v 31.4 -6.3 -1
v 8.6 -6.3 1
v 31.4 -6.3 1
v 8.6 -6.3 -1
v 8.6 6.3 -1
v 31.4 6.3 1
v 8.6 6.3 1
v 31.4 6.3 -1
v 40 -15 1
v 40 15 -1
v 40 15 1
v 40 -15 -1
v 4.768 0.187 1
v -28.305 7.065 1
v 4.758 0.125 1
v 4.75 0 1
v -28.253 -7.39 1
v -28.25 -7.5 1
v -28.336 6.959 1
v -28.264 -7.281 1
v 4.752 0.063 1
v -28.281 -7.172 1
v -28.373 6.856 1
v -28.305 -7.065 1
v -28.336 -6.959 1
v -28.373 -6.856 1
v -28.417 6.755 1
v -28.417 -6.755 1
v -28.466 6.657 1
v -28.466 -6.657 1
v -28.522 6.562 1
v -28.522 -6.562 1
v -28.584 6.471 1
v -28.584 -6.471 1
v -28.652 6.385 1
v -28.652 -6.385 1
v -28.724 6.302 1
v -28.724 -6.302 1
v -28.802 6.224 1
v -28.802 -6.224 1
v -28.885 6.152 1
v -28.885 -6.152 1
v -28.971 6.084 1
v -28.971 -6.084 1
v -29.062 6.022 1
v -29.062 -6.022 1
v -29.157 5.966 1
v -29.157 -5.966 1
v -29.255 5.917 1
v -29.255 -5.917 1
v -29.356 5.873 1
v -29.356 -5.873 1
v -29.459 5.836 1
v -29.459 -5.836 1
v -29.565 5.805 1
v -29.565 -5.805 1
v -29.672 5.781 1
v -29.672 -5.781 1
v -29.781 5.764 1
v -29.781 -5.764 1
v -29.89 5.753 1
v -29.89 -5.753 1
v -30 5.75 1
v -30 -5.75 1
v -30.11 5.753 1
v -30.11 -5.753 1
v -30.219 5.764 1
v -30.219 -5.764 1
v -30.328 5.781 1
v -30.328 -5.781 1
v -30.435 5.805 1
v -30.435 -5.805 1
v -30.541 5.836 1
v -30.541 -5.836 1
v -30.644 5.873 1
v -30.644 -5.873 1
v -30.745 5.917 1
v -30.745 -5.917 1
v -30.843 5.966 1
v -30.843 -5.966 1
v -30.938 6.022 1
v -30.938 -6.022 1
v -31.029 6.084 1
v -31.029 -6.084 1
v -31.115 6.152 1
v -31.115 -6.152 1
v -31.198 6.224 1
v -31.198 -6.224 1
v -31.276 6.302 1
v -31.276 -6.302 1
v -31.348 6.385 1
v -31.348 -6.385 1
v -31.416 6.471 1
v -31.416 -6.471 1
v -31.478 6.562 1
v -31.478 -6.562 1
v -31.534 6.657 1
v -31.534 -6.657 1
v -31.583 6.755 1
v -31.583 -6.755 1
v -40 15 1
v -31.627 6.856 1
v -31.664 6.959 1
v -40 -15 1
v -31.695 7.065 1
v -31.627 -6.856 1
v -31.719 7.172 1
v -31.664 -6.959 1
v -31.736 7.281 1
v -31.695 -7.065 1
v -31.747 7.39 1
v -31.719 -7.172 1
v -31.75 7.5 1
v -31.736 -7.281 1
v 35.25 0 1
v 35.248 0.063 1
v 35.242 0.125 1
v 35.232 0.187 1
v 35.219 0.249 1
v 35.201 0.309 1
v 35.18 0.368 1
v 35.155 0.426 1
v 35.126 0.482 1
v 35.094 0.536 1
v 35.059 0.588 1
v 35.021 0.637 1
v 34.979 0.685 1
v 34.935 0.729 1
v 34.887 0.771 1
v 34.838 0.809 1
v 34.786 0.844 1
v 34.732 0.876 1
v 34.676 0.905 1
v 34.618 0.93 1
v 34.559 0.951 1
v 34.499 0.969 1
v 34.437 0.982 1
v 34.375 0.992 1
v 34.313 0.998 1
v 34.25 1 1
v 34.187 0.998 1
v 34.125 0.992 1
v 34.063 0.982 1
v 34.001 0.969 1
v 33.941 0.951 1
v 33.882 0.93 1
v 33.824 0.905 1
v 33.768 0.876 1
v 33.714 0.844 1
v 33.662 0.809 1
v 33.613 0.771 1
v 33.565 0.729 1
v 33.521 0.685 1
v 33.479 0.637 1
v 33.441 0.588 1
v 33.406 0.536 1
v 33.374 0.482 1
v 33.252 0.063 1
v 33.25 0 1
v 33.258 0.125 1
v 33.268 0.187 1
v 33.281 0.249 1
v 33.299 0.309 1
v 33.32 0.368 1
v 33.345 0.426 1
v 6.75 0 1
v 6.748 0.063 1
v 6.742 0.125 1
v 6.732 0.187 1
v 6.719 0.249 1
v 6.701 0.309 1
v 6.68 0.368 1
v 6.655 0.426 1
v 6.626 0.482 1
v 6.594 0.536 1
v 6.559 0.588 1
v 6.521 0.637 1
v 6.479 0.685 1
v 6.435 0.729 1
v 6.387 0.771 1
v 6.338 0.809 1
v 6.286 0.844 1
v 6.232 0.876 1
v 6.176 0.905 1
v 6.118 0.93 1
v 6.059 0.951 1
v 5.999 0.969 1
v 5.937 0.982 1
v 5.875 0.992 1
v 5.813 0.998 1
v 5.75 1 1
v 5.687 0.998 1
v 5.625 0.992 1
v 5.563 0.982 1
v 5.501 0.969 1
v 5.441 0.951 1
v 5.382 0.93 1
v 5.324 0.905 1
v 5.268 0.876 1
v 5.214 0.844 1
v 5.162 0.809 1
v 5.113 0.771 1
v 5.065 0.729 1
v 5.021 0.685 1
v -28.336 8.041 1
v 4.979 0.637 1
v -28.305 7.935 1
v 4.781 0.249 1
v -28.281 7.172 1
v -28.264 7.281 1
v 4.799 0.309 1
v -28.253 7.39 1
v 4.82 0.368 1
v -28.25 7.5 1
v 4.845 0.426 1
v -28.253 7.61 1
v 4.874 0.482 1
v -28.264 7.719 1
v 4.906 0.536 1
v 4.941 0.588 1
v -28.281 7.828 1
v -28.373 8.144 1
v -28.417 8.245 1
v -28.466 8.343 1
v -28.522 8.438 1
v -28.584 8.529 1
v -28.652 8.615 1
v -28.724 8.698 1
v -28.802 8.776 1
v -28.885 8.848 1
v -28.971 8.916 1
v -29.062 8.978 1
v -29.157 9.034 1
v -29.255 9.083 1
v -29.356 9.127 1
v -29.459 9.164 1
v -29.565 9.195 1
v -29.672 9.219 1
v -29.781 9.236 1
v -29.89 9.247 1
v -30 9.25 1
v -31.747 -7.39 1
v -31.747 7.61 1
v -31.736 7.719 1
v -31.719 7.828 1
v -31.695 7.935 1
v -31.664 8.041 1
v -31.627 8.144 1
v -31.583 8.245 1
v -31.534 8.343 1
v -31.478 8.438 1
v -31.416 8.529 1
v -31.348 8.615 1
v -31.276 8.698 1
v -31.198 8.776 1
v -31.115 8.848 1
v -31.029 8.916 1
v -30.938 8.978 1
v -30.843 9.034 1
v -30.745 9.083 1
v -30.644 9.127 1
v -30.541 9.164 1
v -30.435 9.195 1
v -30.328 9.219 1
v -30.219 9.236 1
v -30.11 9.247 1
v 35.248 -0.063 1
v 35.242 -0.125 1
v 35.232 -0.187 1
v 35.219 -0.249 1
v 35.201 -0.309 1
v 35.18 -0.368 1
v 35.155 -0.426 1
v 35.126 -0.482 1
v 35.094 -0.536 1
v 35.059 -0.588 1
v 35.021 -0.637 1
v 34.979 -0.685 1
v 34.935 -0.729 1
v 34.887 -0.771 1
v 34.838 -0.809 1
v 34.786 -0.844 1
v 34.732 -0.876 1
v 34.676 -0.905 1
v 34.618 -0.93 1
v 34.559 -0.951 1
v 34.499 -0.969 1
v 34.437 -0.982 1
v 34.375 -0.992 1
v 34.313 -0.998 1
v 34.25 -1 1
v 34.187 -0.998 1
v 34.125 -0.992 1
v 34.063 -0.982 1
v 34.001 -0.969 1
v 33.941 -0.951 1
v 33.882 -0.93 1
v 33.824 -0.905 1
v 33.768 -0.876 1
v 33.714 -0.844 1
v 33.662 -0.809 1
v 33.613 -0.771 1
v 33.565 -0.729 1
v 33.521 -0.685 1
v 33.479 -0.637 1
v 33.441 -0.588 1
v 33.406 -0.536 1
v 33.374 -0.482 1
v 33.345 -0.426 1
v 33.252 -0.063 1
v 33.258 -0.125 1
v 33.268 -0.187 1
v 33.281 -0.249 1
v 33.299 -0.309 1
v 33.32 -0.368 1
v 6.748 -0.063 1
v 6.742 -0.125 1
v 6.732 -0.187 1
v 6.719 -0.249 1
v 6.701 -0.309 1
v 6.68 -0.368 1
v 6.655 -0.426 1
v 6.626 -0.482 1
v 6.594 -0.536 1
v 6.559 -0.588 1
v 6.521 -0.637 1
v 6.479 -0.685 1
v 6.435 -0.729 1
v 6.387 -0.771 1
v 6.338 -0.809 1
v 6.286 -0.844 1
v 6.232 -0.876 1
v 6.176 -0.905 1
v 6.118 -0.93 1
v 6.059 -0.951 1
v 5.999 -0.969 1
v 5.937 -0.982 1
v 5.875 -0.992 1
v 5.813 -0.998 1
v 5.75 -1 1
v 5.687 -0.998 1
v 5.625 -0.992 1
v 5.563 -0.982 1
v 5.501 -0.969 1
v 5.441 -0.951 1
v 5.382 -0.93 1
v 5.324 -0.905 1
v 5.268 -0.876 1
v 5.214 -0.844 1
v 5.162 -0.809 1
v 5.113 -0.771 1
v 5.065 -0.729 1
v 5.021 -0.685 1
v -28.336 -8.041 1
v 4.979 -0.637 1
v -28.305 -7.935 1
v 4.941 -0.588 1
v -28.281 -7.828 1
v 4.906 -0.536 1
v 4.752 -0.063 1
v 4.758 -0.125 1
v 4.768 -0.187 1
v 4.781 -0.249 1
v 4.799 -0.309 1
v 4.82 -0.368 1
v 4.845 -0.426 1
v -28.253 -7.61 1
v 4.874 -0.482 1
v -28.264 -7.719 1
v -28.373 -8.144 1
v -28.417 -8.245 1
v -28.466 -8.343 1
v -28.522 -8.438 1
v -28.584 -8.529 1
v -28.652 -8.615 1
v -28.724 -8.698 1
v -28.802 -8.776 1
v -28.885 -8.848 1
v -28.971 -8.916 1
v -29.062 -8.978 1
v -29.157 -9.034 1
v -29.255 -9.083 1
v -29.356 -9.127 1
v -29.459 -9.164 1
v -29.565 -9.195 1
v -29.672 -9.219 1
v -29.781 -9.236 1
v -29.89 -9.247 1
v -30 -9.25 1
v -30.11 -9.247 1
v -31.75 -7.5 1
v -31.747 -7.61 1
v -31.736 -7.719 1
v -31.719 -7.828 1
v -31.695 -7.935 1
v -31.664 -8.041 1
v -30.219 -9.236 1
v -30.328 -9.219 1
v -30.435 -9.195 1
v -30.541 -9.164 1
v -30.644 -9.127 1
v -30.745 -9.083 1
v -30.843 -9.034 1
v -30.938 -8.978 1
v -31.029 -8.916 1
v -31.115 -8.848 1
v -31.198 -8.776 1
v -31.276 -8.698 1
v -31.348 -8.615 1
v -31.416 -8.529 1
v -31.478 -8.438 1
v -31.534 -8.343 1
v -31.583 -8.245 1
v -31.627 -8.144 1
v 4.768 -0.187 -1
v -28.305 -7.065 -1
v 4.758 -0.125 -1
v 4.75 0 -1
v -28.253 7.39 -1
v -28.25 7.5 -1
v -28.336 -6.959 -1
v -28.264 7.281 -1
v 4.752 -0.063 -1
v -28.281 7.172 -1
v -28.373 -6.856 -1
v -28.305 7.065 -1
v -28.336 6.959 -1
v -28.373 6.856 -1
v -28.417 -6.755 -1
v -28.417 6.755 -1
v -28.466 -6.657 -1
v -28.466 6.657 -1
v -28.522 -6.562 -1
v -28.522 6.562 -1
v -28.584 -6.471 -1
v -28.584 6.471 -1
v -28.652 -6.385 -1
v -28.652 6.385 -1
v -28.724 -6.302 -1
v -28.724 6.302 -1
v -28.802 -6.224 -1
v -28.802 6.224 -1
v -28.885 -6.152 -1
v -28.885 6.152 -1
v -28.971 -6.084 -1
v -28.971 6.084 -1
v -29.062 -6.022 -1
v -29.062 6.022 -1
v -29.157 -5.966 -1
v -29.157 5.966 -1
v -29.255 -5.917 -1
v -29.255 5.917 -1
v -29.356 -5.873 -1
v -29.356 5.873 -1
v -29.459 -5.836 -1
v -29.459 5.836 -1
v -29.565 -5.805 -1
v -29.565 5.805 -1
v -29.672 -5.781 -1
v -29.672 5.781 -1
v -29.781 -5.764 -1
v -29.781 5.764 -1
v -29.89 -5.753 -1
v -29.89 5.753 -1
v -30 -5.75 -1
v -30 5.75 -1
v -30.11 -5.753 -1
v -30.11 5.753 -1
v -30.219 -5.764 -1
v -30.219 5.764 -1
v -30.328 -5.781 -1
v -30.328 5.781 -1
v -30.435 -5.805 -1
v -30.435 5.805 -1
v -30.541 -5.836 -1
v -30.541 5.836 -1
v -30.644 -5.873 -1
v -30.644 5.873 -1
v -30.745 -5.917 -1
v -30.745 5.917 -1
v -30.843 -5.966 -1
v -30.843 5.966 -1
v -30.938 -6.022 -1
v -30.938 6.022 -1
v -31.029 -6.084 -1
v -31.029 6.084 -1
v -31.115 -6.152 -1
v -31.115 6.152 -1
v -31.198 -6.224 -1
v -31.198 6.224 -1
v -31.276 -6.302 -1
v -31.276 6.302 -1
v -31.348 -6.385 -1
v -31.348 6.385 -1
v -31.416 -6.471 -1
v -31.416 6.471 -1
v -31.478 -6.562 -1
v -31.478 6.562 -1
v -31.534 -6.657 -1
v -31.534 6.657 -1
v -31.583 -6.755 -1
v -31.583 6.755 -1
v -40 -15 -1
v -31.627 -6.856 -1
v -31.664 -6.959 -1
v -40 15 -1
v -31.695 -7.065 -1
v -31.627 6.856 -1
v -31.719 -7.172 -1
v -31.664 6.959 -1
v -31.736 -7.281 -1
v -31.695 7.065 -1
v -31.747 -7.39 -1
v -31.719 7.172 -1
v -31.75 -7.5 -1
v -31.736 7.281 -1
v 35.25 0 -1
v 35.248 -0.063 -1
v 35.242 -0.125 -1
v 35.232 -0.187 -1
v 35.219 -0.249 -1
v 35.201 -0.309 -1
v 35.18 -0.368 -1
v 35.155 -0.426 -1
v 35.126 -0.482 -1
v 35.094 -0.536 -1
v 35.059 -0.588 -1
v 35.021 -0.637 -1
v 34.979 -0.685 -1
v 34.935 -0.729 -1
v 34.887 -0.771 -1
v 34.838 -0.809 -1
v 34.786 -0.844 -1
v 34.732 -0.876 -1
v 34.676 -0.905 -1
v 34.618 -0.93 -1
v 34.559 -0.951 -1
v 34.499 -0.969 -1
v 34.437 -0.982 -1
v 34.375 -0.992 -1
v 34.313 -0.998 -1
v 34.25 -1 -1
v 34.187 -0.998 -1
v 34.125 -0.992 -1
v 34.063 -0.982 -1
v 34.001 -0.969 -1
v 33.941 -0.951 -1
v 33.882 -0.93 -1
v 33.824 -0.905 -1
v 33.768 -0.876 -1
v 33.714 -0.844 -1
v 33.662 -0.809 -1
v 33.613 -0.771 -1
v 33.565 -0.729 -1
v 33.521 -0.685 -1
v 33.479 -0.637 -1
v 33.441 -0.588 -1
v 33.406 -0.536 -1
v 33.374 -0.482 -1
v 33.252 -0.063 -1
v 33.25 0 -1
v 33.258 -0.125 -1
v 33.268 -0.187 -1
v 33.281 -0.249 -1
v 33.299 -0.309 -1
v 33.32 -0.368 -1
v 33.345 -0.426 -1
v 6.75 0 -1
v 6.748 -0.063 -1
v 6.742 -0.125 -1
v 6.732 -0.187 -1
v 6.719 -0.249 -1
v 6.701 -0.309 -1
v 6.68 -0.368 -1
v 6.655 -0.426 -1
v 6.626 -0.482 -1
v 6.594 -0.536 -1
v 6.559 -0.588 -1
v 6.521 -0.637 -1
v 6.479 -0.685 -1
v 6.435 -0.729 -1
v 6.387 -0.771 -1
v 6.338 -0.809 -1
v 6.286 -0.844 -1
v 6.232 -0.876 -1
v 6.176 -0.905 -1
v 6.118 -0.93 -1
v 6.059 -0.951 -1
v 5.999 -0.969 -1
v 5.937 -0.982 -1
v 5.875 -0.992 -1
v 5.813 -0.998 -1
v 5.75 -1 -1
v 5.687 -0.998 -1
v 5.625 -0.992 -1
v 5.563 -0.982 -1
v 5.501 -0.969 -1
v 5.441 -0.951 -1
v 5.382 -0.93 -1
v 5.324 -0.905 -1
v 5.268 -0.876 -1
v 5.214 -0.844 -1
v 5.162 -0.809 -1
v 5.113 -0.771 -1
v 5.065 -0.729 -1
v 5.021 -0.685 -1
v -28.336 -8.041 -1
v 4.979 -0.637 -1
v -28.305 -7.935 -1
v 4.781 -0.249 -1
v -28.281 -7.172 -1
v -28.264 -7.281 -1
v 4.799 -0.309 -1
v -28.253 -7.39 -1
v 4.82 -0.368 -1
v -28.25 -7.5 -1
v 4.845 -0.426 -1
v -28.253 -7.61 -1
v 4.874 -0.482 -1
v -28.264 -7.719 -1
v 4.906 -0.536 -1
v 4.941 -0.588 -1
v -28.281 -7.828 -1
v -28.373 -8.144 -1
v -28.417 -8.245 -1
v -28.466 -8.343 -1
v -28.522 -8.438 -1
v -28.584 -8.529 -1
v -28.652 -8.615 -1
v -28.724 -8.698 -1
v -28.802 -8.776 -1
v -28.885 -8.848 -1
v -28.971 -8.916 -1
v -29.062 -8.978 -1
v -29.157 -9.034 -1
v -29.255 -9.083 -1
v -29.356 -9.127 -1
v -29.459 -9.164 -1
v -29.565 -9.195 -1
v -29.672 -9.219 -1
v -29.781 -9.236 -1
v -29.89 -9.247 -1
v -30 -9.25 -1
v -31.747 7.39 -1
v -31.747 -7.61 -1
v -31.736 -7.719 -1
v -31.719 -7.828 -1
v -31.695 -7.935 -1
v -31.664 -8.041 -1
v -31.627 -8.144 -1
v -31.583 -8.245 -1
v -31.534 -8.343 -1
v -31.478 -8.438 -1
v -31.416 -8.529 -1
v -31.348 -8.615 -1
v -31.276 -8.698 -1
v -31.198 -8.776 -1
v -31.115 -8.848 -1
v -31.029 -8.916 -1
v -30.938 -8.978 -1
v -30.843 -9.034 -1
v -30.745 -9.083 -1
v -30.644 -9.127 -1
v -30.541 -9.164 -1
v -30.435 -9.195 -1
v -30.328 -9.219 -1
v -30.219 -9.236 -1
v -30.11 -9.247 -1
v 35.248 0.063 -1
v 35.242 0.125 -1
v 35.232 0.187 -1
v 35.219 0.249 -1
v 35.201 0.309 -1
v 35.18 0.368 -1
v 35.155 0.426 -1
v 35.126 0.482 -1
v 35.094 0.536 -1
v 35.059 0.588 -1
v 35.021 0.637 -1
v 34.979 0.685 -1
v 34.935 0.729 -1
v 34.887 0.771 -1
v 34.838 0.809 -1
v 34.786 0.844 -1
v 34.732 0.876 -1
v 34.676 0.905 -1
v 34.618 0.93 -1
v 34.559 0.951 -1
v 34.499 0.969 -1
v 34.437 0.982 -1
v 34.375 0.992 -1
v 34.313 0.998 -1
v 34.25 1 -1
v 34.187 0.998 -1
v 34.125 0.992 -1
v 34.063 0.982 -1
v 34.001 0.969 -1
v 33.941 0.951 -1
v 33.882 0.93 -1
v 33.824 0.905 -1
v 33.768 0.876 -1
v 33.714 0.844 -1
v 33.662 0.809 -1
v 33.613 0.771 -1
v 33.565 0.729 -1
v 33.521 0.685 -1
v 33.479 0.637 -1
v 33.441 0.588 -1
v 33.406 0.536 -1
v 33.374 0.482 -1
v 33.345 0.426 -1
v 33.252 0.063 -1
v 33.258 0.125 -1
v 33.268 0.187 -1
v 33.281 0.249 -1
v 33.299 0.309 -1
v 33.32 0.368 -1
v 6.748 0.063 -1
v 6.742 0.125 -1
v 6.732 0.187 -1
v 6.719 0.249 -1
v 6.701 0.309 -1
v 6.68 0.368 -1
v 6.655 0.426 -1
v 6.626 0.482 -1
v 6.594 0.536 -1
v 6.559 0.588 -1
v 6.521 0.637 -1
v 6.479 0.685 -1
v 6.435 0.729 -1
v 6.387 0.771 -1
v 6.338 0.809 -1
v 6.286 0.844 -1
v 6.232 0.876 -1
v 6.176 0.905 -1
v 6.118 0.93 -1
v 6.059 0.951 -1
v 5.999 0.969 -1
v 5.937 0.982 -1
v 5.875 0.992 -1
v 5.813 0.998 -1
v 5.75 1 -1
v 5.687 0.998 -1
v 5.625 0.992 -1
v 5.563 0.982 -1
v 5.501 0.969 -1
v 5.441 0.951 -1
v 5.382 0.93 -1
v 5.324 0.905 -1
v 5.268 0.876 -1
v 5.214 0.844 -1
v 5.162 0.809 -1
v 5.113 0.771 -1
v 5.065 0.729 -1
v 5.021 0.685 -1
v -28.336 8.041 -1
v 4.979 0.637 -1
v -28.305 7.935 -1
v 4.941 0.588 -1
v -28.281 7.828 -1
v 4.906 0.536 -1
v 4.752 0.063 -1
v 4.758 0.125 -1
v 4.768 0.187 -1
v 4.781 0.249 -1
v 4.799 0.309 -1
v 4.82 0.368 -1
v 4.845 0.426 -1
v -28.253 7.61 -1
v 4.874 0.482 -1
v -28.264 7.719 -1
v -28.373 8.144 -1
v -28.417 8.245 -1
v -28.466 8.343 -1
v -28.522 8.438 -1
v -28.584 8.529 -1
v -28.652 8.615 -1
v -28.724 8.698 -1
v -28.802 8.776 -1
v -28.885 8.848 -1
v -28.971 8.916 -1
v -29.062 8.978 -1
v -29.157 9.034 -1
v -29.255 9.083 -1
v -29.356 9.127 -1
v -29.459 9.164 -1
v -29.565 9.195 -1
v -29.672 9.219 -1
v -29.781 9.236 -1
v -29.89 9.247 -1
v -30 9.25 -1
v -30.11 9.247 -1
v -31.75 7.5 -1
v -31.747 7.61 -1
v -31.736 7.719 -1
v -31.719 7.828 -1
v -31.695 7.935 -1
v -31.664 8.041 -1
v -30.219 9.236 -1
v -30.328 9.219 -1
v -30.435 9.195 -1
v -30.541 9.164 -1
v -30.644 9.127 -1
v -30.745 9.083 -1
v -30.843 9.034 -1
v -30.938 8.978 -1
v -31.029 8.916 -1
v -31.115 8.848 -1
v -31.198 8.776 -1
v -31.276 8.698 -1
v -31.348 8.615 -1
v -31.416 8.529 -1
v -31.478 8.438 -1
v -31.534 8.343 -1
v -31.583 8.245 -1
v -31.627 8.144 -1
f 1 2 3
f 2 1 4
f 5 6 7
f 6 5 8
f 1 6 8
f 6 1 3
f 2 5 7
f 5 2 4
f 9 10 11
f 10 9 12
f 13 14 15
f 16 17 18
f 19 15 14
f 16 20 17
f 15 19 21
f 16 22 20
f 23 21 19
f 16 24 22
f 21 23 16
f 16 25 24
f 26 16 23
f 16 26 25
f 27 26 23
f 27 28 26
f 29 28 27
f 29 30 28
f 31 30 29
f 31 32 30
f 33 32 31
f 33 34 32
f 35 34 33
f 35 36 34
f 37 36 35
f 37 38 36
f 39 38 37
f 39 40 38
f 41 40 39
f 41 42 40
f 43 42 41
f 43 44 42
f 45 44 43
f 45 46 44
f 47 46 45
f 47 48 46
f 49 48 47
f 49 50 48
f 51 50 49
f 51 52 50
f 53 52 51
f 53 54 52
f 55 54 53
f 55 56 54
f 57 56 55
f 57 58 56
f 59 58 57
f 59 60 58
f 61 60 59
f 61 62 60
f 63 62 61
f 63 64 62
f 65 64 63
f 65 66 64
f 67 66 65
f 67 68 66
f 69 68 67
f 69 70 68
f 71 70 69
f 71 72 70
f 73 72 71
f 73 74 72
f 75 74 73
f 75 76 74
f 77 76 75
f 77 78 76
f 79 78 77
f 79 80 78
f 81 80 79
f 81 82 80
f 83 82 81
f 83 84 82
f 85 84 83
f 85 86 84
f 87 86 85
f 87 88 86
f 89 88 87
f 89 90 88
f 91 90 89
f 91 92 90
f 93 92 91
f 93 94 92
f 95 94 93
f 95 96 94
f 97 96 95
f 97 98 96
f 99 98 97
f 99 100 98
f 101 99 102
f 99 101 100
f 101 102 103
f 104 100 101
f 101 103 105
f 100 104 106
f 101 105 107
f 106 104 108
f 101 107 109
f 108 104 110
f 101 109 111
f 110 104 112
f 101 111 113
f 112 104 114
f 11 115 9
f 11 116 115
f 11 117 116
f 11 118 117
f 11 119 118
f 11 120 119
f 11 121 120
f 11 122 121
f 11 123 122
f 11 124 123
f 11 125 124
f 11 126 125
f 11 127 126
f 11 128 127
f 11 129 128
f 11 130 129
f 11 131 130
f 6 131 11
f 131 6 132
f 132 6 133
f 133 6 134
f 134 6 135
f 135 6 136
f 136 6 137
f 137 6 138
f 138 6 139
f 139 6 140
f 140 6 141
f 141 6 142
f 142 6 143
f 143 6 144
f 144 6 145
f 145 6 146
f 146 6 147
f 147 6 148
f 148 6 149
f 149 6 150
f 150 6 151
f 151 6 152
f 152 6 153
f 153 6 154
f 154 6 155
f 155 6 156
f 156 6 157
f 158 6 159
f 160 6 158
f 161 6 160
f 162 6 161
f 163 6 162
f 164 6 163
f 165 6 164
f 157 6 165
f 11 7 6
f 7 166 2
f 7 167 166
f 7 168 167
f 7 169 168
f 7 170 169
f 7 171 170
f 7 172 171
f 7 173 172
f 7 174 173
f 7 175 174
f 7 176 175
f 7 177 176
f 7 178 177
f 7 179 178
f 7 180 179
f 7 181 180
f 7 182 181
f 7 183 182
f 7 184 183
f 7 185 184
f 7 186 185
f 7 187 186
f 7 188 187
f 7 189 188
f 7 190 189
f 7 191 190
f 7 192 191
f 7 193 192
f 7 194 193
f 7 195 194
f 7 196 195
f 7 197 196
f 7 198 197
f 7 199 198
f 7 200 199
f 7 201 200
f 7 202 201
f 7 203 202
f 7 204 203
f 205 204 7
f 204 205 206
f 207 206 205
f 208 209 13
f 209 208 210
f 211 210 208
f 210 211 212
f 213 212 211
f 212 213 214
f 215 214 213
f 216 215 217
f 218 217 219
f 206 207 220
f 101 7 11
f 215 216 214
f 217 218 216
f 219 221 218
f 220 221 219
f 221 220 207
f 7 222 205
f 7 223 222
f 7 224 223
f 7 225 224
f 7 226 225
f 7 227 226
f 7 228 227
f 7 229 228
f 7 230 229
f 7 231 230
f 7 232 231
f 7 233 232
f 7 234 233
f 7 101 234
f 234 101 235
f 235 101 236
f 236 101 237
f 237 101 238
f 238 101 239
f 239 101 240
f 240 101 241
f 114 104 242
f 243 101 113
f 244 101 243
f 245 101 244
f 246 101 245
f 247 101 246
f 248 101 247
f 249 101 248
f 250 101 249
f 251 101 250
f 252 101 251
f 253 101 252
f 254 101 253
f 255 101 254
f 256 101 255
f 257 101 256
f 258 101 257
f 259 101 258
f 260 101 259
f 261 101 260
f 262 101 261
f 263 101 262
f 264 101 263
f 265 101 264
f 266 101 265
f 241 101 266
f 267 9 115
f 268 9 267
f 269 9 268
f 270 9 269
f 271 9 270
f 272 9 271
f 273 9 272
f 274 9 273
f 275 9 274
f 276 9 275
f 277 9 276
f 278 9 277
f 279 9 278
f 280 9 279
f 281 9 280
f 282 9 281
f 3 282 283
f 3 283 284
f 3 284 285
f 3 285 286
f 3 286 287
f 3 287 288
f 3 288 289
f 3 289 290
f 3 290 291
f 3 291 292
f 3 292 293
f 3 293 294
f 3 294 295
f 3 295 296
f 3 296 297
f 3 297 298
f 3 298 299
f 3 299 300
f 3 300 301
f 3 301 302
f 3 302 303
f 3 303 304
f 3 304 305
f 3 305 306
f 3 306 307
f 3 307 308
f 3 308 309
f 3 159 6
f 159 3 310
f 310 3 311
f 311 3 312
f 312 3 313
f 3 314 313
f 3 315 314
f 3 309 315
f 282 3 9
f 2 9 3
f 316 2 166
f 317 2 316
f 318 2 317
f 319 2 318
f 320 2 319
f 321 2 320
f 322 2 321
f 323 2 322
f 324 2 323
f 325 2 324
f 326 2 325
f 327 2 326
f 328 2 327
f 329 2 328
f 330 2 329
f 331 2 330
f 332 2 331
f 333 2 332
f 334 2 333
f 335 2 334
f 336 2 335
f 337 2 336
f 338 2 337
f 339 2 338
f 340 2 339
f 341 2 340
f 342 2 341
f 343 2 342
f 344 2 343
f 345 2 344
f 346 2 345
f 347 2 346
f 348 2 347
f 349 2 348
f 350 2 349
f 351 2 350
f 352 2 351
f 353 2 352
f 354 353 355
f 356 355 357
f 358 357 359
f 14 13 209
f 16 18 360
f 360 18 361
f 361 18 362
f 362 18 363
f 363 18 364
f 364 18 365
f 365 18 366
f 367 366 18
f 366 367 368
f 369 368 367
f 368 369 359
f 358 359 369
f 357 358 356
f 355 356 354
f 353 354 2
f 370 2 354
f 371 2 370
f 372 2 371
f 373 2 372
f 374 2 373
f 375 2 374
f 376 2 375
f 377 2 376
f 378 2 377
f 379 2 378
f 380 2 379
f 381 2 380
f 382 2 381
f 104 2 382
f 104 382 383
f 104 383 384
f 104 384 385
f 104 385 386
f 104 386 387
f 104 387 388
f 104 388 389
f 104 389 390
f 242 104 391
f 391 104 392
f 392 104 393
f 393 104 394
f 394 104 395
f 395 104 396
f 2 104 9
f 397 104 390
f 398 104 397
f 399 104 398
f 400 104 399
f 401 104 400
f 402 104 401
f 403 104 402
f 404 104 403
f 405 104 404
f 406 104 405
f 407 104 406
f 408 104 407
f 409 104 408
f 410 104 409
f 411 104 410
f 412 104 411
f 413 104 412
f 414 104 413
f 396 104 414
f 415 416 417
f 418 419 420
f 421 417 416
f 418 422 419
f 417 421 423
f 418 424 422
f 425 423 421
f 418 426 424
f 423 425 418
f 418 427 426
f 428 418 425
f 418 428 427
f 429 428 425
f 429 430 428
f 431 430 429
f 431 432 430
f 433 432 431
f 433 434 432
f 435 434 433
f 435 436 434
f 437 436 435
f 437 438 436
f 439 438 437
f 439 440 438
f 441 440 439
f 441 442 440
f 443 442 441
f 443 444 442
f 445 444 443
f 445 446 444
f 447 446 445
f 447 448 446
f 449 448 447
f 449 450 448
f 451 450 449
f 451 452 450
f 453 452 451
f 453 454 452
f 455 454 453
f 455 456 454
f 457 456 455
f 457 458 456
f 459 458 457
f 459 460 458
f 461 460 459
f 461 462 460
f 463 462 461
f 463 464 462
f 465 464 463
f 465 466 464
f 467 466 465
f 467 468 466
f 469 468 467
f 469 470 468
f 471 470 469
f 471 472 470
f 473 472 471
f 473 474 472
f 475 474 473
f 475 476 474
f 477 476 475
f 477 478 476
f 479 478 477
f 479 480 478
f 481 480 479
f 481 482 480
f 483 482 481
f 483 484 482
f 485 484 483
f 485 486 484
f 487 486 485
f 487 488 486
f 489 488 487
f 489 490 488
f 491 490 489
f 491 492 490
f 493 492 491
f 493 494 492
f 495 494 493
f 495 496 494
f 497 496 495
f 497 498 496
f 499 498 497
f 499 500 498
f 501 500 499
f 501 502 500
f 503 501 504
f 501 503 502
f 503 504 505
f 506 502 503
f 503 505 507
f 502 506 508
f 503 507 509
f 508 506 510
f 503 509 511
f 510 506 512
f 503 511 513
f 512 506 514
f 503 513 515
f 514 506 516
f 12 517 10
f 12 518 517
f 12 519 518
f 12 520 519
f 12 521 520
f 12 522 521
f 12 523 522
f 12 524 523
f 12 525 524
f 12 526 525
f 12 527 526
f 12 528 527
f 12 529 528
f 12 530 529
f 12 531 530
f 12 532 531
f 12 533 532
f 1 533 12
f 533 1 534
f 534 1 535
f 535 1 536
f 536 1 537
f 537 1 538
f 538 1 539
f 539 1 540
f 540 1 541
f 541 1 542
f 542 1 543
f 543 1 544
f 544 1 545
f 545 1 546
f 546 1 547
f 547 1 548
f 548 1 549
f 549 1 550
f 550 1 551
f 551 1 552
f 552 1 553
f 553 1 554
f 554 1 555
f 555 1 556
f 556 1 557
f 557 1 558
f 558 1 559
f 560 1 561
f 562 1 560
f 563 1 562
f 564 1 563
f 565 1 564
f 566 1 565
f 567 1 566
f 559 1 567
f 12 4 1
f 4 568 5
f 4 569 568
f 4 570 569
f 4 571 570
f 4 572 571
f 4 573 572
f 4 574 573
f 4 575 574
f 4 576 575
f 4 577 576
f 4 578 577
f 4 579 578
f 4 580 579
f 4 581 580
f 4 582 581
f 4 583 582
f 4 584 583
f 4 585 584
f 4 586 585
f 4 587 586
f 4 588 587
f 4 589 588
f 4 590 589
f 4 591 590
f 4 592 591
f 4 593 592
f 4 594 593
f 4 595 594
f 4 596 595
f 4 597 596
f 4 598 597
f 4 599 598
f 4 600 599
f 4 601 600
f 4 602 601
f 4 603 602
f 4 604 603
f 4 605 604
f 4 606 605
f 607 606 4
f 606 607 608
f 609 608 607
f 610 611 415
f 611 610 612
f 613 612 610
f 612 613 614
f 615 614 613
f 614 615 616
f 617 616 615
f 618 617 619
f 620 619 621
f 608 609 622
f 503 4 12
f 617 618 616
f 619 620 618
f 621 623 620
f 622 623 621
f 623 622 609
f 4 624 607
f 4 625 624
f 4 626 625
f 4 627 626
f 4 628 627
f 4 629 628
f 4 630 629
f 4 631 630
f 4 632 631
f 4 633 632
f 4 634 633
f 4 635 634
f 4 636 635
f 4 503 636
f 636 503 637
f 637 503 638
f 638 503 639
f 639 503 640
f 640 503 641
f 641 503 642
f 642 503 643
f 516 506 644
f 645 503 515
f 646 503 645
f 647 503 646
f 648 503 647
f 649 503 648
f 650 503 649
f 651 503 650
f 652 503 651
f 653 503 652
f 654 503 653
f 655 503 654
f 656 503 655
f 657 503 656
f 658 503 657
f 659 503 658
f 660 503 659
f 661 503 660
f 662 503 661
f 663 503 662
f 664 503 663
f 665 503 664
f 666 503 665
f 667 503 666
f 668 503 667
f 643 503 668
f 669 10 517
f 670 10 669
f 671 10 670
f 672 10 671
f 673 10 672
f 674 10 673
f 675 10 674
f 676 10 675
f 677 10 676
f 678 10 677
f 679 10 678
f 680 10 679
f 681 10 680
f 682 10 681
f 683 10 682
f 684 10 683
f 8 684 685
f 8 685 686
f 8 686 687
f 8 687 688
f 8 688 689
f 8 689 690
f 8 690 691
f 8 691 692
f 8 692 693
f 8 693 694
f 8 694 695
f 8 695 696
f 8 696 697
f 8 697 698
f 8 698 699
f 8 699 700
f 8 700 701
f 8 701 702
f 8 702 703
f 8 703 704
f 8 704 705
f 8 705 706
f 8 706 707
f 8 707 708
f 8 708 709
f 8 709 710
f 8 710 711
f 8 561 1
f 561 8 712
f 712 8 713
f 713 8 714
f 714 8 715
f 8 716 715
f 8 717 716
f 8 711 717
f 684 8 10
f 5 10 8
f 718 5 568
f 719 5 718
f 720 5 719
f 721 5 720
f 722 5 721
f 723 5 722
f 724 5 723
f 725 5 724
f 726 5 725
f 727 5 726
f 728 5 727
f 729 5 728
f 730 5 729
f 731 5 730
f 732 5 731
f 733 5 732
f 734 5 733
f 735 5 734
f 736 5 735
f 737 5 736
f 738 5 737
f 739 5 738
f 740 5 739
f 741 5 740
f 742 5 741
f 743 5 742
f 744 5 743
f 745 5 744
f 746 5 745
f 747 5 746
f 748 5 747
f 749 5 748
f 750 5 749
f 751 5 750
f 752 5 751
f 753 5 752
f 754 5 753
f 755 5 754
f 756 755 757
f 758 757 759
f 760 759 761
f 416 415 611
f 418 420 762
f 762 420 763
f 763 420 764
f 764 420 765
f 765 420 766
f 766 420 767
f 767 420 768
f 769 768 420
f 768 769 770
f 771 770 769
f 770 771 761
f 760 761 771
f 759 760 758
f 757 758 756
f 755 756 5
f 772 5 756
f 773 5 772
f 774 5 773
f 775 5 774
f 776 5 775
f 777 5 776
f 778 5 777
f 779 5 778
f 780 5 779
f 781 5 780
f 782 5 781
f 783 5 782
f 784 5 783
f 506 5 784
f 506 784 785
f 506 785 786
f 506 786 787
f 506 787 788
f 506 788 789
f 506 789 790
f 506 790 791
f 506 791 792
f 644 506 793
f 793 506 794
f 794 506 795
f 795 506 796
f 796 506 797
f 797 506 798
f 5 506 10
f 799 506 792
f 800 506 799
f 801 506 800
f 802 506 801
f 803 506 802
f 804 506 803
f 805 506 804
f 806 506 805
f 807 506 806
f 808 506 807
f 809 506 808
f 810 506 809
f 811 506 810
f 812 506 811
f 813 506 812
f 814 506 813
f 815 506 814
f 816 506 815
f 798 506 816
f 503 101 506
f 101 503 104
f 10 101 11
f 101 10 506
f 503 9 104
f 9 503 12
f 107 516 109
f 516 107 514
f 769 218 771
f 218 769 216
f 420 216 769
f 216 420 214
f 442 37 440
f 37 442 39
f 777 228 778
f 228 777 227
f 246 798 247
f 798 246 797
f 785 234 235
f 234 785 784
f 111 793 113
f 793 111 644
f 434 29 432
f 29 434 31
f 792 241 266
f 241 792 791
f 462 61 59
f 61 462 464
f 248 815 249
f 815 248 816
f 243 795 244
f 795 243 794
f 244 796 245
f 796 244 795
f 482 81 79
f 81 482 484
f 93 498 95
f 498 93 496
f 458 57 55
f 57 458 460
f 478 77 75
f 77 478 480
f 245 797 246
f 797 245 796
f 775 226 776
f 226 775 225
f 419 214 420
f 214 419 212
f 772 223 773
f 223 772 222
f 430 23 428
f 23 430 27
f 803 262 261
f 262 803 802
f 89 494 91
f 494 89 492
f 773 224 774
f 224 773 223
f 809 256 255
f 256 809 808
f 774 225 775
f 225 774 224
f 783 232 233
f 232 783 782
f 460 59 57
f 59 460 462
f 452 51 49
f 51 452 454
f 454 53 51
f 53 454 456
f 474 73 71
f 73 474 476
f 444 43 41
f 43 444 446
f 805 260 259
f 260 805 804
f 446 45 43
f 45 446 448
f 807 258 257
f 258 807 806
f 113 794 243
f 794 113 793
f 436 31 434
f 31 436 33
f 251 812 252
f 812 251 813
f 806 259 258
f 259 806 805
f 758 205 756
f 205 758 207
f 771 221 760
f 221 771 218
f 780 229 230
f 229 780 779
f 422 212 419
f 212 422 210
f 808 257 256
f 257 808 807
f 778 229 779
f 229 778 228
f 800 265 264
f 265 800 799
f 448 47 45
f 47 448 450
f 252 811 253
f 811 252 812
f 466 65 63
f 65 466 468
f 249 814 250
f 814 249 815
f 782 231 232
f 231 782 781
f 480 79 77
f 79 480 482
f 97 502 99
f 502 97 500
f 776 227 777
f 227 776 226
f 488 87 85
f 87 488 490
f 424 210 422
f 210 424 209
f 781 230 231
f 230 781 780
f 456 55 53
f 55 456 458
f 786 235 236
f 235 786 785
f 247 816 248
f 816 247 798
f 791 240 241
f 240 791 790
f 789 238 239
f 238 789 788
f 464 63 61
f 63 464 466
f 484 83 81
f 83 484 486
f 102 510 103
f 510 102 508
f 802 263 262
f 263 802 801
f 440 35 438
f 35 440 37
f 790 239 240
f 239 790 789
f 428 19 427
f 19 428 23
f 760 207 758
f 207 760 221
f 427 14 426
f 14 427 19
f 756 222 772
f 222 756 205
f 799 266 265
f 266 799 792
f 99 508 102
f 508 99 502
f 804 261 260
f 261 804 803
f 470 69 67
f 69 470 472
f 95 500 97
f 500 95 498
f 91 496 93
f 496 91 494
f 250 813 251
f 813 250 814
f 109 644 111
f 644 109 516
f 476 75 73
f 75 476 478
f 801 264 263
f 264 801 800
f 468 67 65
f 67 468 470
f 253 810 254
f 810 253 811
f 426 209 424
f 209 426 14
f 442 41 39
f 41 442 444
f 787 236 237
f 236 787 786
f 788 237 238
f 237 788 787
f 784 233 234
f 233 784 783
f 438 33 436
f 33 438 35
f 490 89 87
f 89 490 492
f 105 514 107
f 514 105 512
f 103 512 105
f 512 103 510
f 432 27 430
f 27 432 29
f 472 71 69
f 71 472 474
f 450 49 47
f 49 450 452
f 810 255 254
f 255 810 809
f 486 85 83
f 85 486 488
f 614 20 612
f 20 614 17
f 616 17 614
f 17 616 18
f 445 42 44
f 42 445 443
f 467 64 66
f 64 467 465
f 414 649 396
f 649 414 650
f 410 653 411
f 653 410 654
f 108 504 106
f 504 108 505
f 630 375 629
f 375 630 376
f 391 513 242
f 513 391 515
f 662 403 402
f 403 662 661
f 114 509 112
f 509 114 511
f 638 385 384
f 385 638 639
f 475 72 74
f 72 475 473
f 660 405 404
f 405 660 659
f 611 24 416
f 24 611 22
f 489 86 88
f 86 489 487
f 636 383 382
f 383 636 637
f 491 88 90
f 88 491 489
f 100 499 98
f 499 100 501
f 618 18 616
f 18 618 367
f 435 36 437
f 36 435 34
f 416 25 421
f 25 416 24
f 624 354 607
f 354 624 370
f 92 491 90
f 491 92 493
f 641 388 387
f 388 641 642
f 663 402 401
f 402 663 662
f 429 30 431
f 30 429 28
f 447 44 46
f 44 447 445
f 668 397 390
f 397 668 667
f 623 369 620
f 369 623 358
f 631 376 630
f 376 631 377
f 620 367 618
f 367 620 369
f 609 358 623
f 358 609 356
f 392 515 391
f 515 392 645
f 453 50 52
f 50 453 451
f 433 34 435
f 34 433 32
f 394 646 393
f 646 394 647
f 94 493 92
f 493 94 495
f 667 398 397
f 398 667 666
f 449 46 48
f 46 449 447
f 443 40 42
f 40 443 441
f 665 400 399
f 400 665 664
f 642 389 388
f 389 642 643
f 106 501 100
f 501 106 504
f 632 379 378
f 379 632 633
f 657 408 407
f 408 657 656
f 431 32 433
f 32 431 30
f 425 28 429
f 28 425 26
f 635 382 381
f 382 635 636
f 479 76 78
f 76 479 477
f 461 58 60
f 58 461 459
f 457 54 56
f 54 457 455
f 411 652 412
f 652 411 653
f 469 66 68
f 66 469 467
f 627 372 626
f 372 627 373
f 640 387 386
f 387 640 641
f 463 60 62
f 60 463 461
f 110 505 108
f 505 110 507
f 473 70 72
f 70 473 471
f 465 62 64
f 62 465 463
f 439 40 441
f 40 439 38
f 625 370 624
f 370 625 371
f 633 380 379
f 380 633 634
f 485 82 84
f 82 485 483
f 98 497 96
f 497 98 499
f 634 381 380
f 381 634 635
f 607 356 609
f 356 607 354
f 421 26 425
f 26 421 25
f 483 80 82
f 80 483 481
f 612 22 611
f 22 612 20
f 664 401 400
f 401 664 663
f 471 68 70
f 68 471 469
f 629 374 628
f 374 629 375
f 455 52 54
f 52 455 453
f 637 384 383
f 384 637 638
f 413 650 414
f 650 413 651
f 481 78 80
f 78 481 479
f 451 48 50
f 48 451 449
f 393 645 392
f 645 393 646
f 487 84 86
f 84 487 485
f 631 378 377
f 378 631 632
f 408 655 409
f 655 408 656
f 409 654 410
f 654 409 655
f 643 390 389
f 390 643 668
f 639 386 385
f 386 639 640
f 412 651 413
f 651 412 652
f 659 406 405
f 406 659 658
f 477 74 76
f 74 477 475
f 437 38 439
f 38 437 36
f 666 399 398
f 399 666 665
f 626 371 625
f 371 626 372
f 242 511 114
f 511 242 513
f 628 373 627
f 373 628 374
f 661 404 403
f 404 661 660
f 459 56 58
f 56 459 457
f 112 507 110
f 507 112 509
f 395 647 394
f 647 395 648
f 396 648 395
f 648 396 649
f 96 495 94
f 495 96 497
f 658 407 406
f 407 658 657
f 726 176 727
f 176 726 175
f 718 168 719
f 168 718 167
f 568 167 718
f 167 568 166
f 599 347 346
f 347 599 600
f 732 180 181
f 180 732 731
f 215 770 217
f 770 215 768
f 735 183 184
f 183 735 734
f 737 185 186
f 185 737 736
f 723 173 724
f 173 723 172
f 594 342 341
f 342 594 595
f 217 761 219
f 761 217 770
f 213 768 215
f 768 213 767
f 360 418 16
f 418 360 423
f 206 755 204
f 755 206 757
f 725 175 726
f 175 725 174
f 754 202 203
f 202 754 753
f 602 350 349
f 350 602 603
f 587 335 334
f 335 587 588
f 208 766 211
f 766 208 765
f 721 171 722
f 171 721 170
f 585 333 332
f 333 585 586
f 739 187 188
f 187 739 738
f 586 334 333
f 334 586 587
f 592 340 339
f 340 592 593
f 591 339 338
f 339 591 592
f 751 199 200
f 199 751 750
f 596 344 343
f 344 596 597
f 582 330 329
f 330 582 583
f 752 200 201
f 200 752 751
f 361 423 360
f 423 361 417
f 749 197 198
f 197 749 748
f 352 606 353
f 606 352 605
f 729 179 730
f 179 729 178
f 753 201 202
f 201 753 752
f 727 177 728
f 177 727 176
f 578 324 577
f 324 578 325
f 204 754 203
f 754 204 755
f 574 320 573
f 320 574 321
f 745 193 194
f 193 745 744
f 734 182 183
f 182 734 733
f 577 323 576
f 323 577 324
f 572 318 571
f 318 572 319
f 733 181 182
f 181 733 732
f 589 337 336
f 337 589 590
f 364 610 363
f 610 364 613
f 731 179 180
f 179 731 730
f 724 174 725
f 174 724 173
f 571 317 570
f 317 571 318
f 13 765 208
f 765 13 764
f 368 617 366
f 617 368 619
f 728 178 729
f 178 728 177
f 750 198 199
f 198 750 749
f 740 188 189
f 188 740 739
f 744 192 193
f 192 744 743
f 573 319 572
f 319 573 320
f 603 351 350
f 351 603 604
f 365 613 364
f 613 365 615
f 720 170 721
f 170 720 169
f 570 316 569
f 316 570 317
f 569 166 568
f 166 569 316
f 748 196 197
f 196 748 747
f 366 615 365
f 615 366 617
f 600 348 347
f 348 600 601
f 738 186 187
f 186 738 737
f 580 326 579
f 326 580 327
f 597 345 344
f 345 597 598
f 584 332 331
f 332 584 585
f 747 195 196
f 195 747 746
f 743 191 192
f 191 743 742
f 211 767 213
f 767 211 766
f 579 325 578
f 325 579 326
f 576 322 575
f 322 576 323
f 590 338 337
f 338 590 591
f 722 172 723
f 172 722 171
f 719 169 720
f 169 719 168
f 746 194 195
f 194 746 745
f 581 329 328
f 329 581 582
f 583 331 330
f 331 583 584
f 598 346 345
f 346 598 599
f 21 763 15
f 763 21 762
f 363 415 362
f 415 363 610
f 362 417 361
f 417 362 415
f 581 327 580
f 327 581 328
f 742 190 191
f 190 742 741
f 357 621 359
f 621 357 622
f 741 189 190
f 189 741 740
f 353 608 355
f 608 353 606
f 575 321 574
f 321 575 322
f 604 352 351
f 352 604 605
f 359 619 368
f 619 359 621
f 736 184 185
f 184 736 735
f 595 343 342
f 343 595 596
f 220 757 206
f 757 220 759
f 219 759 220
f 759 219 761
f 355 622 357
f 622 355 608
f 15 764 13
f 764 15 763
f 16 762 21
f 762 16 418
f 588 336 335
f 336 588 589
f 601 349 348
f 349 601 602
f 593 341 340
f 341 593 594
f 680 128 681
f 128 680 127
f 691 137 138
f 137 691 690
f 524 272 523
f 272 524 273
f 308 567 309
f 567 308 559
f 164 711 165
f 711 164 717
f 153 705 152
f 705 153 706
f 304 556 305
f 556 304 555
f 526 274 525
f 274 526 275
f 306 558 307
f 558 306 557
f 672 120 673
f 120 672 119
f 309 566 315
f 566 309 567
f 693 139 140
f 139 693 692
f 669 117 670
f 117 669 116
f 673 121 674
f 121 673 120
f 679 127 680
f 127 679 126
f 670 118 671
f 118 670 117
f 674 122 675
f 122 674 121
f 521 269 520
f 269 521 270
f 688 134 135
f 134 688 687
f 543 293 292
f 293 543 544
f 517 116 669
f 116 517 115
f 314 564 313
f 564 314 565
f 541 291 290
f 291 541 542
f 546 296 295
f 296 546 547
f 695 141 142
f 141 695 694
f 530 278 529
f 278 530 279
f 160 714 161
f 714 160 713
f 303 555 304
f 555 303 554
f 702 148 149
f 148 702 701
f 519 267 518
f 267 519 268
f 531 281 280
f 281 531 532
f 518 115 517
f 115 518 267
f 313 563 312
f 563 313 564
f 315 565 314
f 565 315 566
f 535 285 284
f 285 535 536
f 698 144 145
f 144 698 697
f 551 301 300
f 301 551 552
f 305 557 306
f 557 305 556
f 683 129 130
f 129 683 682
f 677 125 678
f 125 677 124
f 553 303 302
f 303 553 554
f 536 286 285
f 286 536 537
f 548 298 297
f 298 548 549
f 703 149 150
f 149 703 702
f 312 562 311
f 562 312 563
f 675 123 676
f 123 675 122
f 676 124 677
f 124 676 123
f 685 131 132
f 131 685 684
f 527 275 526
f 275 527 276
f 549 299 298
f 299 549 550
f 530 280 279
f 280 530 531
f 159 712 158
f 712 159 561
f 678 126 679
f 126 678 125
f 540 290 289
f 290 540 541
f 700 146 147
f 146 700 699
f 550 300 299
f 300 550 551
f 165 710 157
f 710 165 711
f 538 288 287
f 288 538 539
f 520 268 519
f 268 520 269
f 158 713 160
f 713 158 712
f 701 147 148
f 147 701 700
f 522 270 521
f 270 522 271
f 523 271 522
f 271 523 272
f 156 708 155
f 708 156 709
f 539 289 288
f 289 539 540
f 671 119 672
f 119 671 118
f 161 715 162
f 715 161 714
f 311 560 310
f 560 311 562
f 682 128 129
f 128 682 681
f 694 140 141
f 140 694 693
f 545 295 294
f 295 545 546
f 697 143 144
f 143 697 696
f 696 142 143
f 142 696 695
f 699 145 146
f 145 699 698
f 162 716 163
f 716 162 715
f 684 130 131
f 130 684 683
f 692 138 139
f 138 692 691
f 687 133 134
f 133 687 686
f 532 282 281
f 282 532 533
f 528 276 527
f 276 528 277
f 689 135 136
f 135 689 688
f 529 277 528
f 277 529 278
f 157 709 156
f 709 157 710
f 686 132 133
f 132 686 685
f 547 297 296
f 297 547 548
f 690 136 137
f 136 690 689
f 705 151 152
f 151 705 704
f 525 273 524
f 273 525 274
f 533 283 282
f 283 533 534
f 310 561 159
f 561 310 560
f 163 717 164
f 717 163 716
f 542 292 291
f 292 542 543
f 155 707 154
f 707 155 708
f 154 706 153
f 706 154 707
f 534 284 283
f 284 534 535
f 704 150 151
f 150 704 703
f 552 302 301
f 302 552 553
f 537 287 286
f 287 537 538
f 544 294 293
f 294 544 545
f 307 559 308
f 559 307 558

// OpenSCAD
$fn = 100;

difference()
{
    // main board
    cube([80,30,2], center=true);

    // chassis screw holes
    translate([-30,30/4,-5]) cylinder(d=3.5, h=10);
    translate([-30,-30/4,-5]) cylinder(d=3.5, h=10);

    // servo hole
    #translate([20,0,18.5]) rotate([180,0,0]) sg90();

    // servo screw holes
    translate([-32.5/2+2+20,0,-5]) cylinder(d=2, h=10);
    translate([32.5/2-2+20,0,-5]) cylinder(d=2, h=10);
}

module sg90()
{
    translate([0,0,22.8/2]) cube([22.8,12.6,22.7], center=true); // main box

    translate([0,0,22.8-1])
    {
        hull()
        {
            translate([-1,0,0]) cylinder(d=5, h=4+1); // semi-circle
            translate([1,0,0]) cylinder(d=5, h=4+1);
        }

        translate([5,0,0]) cylinder(d=12.6, h=4+1); // large cylinder
    }

    translate([5,0,22.5-1+4])
    {
        difference()
        {
            cylinder(d=4.6, h=3.2+1); // small cylinder
            translate([0,0,1]) cylinder(d=1.7, h=4); // hole
        }
    }

    difference()
    {
        translate([0,0,16]) cube([32.5,12.6,2.5], center=true); // screw tabs

        translate([-32.5/2+2,0,16-2])
        {
            cylinder(d=2, h=2.5+1); // screw hole
            translate([-2,0,2]) cube([4,1.3,1.3+2], center=true);
        }

        translate([32.5/2-2,0,16-2])
        {
            cylinder(d=2, h=2.5+1); // screw hole
            translate([2,0,2]) cube([4,1.3,1.3+2], center=true);
        }
    }
}
